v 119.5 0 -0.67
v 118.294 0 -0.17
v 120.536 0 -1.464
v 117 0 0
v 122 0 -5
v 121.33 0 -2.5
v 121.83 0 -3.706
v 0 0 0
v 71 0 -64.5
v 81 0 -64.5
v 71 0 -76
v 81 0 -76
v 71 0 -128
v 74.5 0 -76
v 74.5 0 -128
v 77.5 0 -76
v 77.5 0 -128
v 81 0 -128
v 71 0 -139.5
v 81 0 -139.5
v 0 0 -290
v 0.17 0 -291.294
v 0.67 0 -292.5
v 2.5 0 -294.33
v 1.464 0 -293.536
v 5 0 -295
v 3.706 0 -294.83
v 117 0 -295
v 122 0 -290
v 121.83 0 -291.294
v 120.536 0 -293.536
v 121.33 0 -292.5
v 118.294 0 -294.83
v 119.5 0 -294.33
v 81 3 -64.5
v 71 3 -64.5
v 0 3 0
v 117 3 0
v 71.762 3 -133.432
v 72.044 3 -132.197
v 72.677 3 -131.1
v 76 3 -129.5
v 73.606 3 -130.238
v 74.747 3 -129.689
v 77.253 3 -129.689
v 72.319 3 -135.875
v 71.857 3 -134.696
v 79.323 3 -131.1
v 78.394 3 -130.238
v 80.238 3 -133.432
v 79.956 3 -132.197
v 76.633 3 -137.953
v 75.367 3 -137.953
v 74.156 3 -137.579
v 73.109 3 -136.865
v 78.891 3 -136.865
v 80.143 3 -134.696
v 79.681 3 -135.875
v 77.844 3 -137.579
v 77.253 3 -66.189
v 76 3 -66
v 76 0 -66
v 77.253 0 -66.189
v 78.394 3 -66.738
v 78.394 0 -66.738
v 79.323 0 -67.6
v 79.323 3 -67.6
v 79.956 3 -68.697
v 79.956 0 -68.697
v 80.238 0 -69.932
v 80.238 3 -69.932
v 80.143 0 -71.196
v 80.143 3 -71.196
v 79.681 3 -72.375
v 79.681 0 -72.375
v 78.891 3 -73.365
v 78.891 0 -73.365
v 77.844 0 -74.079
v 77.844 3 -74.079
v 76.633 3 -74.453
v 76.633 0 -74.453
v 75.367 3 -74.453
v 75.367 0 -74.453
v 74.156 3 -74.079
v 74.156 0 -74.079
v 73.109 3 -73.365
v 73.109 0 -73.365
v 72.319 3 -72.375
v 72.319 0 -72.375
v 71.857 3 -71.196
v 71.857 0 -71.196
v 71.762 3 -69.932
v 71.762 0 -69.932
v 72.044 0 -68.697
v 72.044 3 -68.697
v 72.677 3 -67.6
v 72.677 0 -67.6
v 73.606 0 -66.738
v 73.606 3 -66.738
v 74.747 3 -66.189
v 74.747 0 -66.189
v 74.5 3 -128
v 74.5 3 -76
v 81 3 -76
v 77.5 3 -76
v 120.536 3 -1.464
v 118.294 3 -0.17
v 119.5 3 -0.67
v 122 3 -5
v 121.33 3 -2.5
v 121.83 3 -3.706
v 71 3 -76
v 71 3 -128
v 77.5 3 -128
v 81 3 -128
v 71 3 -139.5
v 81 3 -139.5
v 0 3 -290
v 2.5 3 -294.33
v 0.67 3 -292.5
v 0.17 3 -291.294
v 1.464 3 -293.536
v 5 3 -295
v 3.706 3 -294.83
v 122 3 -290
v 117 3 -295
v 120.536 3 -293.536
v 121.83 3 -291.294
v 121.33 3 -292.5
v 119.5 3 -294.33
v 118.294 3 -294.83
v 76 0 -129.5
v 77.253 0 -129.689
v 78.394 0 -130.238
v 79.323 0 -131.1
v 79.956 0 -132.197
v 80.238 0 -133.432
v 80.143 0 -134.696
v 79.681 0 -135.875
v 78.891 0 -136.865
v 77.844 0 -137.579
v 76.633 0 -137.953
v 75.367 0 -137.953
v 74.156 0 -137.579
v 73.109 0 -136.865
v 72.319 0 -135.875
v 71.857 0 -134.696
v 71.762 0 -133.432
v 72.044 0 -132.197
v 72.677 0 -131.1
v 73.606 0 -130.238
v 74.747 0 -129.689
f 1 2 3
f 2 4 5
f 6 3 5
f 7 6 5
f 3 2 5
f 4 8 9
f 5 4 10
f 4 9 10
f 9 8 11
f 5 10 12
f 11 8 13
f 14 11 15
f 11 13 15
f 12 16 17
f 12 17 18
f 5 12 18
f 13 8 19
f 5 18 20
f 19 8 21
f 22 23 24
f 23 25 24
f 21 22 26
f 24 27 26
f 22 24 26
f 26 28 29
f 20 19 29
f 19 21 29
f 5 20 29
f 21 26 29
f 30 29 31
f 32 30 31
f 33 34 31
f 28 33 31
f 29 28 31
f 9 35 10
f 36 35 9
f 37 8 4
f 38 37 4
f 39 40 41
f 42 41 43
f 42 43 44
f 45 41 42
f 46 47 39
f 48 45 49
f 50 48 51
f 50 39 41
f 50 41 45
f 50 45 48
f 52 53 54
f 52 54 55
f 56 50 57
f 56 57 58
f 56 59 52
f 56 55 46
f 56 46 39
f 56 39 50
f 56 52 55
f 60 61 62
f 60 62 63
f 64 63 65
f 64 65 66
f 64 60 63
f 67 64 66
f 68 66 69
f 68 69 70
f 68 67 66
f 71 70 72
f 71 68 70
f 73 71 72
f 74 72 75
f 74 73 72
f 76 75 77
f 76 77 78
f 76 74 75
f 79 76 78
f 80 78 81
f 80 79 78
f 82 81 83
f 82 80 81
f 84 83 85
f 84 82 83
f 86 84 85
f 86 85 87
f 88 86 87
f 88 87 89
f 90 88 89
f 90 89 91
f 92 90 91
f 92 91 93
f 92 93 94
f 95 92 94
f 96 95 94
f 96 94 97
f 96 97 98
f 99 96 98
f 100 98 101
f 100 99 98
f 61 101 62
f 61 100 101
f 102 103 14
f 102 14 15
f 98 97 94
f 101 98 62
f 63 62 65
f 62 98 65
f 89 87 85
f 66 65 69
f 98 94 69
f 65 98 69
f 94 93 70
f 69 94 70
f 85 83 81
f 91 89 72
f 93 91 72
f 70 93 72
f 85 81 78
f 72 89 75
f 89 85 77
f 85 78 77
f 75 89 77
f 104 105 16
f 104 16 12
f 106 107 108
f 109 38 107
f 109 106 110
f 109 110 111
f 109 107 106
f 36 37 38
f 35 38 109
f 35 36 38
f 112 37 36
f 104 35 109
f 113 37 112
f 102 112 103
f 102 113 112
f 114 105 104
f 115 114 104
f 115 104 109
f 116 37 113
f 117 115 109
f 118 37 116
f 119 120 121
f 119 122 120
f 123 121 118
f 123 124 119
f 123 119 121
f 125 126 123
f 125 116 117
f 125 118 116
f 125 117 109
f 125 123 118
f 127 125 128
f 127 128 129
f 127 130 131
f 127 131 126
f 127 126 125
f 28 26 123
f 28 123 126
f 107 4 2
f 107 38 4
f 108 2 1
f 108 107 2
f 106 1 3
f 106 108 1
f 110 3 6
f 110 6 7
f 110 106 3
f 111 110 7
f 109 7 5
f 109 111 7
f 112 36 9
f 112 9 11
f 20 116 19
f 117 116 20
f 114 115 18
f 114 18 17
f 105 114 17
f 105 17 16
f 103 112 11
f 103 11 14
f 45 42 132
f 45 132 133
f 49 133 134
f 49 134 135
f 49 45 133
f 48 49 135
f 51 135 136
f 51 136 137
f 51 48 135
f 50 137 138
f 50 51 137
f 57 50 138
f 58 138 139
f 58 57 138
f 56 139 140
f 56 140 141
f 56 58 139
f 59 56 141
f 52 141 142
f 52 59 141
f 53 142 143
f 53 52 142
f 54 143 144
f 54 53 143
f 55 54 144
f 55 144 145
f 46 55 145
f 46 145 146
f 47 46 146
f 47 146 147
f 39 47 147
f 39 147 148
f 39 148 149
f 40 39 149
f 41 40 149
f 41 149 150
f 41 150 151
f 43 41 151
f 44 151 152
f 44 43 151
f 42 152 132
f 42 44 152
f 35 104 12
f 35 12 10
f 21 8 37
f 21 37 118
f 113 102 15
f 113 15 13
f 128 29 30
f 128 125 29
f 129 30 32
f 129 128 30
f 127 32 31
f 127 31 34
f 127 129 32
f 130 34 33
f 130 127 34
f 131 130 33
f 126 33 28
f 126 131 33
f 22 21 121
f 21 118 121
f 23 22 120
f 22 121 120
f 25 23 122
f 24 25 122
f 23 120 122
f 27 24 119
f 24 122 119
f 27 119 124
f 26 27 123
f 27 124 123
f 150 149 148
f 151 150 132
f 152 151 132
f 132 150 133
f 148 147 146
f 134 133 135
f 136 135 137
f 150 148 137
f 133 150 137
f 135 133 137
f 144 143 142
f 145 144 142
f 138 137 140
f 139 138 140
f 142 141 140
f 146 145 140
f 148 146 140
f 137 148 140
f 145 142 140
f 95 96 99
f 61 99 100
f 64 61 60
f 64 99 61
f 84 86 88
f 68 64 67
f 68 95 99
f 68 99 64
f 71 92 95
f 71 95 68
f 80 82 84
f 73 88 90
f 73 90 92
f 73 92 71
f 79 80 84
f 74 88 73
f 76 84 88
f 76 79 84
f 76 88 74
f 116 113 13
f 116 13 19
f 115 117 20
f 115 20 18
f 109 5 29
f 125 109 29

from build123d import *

# Parameters (mm, degrees)
SKETCH1_W           = 122
SKETCH1_H           = 295
BOSS_EXTRUDE1_DEPTH = 3
FILLET1_R           = 5
SKETCH2_R           = 4.25
CUT_EXTRUDE1_DEPTH  = 3


with BuildPart() as part:
    # Sketch1 → Boss-Extrude1 (new body)
    with BuildSketch(Plane(origin=(0, 0, 0), x_dir=(1, 0, 0), z_dir=(0, 1, 0))):
        with Locations((61, 147.5)):
            Rectangle(SKETCH1_W, SKETCH1_H)
    extrude(amount=BOSS_EXTRUDE1_DEPTH)

    # Fillet1
    fillet1_edges = [part.edges().sort_by_distance(p)[0] for p in [
        (0, 1.5, -295),
        (122, 1.5, -295),
        (122, 1.5, 0),
    ]]
    fillet(fillet1_edges, radius=FILLET1_R)

    # Sketch2 → Cut-Extrude1 (cut)
    with BuildSketch(Plane(origin=(0, 3, 0), x_dir=(1, 0, 0), z_dir=(0, 1, 0))):
        Polygon((71, 139.5), (81, 139.5), (81, 128), (77.5, 128), (77.5, 76), (81, 76), (81, 64.5), (71, 64.5), (71, 76), (74.5, 76), (74.5, 128), (71, 128), align=None)
        with Locations(Location((76, 133.75, 0), (0, 0, 270))):
            Circle(SKETCH2_R, mode=Mode.SUBTRACT)
        with Locations(Location((76, 70.25, 0), (0, 0, 270))):
            Circle(SKETCH2_R, mode=Mode.SUBTRACT)
    extrude(amount=-CUT_EXTRUDE1_DEPTH, mode=Mode.SUBTRACT)


with BuildPart() as cut_extrude1_piece_1:
    # of the separate pieces the step leaves, piece 1, a body of its own (cut_extrude1_pieces)
    add(part.part.solids().sort_by_distance((117, 0, 0))[0])


with BuildPart() as cut_extrude1_piece_2:
    # of the separate pieces the step leaves, piece 2, a body of its own (cut_extrude1_pieces)
    add(part.part.solids().sort_by_distance((76, 0, -66))[0])


with BuildPart() as cut_extrude1_piece_3:
    # of the separate pieces the step leaves, piece 3, a body of its own (cut_extrude1_pieces)
    add(part.part.solids().sort_by_distance((76, 0, -129.5))[0])


solid = Compound([cut_extrude1_piece_1.part, cut_extrude1_piece_2.part, cut_extrude1_piece_3.part])
